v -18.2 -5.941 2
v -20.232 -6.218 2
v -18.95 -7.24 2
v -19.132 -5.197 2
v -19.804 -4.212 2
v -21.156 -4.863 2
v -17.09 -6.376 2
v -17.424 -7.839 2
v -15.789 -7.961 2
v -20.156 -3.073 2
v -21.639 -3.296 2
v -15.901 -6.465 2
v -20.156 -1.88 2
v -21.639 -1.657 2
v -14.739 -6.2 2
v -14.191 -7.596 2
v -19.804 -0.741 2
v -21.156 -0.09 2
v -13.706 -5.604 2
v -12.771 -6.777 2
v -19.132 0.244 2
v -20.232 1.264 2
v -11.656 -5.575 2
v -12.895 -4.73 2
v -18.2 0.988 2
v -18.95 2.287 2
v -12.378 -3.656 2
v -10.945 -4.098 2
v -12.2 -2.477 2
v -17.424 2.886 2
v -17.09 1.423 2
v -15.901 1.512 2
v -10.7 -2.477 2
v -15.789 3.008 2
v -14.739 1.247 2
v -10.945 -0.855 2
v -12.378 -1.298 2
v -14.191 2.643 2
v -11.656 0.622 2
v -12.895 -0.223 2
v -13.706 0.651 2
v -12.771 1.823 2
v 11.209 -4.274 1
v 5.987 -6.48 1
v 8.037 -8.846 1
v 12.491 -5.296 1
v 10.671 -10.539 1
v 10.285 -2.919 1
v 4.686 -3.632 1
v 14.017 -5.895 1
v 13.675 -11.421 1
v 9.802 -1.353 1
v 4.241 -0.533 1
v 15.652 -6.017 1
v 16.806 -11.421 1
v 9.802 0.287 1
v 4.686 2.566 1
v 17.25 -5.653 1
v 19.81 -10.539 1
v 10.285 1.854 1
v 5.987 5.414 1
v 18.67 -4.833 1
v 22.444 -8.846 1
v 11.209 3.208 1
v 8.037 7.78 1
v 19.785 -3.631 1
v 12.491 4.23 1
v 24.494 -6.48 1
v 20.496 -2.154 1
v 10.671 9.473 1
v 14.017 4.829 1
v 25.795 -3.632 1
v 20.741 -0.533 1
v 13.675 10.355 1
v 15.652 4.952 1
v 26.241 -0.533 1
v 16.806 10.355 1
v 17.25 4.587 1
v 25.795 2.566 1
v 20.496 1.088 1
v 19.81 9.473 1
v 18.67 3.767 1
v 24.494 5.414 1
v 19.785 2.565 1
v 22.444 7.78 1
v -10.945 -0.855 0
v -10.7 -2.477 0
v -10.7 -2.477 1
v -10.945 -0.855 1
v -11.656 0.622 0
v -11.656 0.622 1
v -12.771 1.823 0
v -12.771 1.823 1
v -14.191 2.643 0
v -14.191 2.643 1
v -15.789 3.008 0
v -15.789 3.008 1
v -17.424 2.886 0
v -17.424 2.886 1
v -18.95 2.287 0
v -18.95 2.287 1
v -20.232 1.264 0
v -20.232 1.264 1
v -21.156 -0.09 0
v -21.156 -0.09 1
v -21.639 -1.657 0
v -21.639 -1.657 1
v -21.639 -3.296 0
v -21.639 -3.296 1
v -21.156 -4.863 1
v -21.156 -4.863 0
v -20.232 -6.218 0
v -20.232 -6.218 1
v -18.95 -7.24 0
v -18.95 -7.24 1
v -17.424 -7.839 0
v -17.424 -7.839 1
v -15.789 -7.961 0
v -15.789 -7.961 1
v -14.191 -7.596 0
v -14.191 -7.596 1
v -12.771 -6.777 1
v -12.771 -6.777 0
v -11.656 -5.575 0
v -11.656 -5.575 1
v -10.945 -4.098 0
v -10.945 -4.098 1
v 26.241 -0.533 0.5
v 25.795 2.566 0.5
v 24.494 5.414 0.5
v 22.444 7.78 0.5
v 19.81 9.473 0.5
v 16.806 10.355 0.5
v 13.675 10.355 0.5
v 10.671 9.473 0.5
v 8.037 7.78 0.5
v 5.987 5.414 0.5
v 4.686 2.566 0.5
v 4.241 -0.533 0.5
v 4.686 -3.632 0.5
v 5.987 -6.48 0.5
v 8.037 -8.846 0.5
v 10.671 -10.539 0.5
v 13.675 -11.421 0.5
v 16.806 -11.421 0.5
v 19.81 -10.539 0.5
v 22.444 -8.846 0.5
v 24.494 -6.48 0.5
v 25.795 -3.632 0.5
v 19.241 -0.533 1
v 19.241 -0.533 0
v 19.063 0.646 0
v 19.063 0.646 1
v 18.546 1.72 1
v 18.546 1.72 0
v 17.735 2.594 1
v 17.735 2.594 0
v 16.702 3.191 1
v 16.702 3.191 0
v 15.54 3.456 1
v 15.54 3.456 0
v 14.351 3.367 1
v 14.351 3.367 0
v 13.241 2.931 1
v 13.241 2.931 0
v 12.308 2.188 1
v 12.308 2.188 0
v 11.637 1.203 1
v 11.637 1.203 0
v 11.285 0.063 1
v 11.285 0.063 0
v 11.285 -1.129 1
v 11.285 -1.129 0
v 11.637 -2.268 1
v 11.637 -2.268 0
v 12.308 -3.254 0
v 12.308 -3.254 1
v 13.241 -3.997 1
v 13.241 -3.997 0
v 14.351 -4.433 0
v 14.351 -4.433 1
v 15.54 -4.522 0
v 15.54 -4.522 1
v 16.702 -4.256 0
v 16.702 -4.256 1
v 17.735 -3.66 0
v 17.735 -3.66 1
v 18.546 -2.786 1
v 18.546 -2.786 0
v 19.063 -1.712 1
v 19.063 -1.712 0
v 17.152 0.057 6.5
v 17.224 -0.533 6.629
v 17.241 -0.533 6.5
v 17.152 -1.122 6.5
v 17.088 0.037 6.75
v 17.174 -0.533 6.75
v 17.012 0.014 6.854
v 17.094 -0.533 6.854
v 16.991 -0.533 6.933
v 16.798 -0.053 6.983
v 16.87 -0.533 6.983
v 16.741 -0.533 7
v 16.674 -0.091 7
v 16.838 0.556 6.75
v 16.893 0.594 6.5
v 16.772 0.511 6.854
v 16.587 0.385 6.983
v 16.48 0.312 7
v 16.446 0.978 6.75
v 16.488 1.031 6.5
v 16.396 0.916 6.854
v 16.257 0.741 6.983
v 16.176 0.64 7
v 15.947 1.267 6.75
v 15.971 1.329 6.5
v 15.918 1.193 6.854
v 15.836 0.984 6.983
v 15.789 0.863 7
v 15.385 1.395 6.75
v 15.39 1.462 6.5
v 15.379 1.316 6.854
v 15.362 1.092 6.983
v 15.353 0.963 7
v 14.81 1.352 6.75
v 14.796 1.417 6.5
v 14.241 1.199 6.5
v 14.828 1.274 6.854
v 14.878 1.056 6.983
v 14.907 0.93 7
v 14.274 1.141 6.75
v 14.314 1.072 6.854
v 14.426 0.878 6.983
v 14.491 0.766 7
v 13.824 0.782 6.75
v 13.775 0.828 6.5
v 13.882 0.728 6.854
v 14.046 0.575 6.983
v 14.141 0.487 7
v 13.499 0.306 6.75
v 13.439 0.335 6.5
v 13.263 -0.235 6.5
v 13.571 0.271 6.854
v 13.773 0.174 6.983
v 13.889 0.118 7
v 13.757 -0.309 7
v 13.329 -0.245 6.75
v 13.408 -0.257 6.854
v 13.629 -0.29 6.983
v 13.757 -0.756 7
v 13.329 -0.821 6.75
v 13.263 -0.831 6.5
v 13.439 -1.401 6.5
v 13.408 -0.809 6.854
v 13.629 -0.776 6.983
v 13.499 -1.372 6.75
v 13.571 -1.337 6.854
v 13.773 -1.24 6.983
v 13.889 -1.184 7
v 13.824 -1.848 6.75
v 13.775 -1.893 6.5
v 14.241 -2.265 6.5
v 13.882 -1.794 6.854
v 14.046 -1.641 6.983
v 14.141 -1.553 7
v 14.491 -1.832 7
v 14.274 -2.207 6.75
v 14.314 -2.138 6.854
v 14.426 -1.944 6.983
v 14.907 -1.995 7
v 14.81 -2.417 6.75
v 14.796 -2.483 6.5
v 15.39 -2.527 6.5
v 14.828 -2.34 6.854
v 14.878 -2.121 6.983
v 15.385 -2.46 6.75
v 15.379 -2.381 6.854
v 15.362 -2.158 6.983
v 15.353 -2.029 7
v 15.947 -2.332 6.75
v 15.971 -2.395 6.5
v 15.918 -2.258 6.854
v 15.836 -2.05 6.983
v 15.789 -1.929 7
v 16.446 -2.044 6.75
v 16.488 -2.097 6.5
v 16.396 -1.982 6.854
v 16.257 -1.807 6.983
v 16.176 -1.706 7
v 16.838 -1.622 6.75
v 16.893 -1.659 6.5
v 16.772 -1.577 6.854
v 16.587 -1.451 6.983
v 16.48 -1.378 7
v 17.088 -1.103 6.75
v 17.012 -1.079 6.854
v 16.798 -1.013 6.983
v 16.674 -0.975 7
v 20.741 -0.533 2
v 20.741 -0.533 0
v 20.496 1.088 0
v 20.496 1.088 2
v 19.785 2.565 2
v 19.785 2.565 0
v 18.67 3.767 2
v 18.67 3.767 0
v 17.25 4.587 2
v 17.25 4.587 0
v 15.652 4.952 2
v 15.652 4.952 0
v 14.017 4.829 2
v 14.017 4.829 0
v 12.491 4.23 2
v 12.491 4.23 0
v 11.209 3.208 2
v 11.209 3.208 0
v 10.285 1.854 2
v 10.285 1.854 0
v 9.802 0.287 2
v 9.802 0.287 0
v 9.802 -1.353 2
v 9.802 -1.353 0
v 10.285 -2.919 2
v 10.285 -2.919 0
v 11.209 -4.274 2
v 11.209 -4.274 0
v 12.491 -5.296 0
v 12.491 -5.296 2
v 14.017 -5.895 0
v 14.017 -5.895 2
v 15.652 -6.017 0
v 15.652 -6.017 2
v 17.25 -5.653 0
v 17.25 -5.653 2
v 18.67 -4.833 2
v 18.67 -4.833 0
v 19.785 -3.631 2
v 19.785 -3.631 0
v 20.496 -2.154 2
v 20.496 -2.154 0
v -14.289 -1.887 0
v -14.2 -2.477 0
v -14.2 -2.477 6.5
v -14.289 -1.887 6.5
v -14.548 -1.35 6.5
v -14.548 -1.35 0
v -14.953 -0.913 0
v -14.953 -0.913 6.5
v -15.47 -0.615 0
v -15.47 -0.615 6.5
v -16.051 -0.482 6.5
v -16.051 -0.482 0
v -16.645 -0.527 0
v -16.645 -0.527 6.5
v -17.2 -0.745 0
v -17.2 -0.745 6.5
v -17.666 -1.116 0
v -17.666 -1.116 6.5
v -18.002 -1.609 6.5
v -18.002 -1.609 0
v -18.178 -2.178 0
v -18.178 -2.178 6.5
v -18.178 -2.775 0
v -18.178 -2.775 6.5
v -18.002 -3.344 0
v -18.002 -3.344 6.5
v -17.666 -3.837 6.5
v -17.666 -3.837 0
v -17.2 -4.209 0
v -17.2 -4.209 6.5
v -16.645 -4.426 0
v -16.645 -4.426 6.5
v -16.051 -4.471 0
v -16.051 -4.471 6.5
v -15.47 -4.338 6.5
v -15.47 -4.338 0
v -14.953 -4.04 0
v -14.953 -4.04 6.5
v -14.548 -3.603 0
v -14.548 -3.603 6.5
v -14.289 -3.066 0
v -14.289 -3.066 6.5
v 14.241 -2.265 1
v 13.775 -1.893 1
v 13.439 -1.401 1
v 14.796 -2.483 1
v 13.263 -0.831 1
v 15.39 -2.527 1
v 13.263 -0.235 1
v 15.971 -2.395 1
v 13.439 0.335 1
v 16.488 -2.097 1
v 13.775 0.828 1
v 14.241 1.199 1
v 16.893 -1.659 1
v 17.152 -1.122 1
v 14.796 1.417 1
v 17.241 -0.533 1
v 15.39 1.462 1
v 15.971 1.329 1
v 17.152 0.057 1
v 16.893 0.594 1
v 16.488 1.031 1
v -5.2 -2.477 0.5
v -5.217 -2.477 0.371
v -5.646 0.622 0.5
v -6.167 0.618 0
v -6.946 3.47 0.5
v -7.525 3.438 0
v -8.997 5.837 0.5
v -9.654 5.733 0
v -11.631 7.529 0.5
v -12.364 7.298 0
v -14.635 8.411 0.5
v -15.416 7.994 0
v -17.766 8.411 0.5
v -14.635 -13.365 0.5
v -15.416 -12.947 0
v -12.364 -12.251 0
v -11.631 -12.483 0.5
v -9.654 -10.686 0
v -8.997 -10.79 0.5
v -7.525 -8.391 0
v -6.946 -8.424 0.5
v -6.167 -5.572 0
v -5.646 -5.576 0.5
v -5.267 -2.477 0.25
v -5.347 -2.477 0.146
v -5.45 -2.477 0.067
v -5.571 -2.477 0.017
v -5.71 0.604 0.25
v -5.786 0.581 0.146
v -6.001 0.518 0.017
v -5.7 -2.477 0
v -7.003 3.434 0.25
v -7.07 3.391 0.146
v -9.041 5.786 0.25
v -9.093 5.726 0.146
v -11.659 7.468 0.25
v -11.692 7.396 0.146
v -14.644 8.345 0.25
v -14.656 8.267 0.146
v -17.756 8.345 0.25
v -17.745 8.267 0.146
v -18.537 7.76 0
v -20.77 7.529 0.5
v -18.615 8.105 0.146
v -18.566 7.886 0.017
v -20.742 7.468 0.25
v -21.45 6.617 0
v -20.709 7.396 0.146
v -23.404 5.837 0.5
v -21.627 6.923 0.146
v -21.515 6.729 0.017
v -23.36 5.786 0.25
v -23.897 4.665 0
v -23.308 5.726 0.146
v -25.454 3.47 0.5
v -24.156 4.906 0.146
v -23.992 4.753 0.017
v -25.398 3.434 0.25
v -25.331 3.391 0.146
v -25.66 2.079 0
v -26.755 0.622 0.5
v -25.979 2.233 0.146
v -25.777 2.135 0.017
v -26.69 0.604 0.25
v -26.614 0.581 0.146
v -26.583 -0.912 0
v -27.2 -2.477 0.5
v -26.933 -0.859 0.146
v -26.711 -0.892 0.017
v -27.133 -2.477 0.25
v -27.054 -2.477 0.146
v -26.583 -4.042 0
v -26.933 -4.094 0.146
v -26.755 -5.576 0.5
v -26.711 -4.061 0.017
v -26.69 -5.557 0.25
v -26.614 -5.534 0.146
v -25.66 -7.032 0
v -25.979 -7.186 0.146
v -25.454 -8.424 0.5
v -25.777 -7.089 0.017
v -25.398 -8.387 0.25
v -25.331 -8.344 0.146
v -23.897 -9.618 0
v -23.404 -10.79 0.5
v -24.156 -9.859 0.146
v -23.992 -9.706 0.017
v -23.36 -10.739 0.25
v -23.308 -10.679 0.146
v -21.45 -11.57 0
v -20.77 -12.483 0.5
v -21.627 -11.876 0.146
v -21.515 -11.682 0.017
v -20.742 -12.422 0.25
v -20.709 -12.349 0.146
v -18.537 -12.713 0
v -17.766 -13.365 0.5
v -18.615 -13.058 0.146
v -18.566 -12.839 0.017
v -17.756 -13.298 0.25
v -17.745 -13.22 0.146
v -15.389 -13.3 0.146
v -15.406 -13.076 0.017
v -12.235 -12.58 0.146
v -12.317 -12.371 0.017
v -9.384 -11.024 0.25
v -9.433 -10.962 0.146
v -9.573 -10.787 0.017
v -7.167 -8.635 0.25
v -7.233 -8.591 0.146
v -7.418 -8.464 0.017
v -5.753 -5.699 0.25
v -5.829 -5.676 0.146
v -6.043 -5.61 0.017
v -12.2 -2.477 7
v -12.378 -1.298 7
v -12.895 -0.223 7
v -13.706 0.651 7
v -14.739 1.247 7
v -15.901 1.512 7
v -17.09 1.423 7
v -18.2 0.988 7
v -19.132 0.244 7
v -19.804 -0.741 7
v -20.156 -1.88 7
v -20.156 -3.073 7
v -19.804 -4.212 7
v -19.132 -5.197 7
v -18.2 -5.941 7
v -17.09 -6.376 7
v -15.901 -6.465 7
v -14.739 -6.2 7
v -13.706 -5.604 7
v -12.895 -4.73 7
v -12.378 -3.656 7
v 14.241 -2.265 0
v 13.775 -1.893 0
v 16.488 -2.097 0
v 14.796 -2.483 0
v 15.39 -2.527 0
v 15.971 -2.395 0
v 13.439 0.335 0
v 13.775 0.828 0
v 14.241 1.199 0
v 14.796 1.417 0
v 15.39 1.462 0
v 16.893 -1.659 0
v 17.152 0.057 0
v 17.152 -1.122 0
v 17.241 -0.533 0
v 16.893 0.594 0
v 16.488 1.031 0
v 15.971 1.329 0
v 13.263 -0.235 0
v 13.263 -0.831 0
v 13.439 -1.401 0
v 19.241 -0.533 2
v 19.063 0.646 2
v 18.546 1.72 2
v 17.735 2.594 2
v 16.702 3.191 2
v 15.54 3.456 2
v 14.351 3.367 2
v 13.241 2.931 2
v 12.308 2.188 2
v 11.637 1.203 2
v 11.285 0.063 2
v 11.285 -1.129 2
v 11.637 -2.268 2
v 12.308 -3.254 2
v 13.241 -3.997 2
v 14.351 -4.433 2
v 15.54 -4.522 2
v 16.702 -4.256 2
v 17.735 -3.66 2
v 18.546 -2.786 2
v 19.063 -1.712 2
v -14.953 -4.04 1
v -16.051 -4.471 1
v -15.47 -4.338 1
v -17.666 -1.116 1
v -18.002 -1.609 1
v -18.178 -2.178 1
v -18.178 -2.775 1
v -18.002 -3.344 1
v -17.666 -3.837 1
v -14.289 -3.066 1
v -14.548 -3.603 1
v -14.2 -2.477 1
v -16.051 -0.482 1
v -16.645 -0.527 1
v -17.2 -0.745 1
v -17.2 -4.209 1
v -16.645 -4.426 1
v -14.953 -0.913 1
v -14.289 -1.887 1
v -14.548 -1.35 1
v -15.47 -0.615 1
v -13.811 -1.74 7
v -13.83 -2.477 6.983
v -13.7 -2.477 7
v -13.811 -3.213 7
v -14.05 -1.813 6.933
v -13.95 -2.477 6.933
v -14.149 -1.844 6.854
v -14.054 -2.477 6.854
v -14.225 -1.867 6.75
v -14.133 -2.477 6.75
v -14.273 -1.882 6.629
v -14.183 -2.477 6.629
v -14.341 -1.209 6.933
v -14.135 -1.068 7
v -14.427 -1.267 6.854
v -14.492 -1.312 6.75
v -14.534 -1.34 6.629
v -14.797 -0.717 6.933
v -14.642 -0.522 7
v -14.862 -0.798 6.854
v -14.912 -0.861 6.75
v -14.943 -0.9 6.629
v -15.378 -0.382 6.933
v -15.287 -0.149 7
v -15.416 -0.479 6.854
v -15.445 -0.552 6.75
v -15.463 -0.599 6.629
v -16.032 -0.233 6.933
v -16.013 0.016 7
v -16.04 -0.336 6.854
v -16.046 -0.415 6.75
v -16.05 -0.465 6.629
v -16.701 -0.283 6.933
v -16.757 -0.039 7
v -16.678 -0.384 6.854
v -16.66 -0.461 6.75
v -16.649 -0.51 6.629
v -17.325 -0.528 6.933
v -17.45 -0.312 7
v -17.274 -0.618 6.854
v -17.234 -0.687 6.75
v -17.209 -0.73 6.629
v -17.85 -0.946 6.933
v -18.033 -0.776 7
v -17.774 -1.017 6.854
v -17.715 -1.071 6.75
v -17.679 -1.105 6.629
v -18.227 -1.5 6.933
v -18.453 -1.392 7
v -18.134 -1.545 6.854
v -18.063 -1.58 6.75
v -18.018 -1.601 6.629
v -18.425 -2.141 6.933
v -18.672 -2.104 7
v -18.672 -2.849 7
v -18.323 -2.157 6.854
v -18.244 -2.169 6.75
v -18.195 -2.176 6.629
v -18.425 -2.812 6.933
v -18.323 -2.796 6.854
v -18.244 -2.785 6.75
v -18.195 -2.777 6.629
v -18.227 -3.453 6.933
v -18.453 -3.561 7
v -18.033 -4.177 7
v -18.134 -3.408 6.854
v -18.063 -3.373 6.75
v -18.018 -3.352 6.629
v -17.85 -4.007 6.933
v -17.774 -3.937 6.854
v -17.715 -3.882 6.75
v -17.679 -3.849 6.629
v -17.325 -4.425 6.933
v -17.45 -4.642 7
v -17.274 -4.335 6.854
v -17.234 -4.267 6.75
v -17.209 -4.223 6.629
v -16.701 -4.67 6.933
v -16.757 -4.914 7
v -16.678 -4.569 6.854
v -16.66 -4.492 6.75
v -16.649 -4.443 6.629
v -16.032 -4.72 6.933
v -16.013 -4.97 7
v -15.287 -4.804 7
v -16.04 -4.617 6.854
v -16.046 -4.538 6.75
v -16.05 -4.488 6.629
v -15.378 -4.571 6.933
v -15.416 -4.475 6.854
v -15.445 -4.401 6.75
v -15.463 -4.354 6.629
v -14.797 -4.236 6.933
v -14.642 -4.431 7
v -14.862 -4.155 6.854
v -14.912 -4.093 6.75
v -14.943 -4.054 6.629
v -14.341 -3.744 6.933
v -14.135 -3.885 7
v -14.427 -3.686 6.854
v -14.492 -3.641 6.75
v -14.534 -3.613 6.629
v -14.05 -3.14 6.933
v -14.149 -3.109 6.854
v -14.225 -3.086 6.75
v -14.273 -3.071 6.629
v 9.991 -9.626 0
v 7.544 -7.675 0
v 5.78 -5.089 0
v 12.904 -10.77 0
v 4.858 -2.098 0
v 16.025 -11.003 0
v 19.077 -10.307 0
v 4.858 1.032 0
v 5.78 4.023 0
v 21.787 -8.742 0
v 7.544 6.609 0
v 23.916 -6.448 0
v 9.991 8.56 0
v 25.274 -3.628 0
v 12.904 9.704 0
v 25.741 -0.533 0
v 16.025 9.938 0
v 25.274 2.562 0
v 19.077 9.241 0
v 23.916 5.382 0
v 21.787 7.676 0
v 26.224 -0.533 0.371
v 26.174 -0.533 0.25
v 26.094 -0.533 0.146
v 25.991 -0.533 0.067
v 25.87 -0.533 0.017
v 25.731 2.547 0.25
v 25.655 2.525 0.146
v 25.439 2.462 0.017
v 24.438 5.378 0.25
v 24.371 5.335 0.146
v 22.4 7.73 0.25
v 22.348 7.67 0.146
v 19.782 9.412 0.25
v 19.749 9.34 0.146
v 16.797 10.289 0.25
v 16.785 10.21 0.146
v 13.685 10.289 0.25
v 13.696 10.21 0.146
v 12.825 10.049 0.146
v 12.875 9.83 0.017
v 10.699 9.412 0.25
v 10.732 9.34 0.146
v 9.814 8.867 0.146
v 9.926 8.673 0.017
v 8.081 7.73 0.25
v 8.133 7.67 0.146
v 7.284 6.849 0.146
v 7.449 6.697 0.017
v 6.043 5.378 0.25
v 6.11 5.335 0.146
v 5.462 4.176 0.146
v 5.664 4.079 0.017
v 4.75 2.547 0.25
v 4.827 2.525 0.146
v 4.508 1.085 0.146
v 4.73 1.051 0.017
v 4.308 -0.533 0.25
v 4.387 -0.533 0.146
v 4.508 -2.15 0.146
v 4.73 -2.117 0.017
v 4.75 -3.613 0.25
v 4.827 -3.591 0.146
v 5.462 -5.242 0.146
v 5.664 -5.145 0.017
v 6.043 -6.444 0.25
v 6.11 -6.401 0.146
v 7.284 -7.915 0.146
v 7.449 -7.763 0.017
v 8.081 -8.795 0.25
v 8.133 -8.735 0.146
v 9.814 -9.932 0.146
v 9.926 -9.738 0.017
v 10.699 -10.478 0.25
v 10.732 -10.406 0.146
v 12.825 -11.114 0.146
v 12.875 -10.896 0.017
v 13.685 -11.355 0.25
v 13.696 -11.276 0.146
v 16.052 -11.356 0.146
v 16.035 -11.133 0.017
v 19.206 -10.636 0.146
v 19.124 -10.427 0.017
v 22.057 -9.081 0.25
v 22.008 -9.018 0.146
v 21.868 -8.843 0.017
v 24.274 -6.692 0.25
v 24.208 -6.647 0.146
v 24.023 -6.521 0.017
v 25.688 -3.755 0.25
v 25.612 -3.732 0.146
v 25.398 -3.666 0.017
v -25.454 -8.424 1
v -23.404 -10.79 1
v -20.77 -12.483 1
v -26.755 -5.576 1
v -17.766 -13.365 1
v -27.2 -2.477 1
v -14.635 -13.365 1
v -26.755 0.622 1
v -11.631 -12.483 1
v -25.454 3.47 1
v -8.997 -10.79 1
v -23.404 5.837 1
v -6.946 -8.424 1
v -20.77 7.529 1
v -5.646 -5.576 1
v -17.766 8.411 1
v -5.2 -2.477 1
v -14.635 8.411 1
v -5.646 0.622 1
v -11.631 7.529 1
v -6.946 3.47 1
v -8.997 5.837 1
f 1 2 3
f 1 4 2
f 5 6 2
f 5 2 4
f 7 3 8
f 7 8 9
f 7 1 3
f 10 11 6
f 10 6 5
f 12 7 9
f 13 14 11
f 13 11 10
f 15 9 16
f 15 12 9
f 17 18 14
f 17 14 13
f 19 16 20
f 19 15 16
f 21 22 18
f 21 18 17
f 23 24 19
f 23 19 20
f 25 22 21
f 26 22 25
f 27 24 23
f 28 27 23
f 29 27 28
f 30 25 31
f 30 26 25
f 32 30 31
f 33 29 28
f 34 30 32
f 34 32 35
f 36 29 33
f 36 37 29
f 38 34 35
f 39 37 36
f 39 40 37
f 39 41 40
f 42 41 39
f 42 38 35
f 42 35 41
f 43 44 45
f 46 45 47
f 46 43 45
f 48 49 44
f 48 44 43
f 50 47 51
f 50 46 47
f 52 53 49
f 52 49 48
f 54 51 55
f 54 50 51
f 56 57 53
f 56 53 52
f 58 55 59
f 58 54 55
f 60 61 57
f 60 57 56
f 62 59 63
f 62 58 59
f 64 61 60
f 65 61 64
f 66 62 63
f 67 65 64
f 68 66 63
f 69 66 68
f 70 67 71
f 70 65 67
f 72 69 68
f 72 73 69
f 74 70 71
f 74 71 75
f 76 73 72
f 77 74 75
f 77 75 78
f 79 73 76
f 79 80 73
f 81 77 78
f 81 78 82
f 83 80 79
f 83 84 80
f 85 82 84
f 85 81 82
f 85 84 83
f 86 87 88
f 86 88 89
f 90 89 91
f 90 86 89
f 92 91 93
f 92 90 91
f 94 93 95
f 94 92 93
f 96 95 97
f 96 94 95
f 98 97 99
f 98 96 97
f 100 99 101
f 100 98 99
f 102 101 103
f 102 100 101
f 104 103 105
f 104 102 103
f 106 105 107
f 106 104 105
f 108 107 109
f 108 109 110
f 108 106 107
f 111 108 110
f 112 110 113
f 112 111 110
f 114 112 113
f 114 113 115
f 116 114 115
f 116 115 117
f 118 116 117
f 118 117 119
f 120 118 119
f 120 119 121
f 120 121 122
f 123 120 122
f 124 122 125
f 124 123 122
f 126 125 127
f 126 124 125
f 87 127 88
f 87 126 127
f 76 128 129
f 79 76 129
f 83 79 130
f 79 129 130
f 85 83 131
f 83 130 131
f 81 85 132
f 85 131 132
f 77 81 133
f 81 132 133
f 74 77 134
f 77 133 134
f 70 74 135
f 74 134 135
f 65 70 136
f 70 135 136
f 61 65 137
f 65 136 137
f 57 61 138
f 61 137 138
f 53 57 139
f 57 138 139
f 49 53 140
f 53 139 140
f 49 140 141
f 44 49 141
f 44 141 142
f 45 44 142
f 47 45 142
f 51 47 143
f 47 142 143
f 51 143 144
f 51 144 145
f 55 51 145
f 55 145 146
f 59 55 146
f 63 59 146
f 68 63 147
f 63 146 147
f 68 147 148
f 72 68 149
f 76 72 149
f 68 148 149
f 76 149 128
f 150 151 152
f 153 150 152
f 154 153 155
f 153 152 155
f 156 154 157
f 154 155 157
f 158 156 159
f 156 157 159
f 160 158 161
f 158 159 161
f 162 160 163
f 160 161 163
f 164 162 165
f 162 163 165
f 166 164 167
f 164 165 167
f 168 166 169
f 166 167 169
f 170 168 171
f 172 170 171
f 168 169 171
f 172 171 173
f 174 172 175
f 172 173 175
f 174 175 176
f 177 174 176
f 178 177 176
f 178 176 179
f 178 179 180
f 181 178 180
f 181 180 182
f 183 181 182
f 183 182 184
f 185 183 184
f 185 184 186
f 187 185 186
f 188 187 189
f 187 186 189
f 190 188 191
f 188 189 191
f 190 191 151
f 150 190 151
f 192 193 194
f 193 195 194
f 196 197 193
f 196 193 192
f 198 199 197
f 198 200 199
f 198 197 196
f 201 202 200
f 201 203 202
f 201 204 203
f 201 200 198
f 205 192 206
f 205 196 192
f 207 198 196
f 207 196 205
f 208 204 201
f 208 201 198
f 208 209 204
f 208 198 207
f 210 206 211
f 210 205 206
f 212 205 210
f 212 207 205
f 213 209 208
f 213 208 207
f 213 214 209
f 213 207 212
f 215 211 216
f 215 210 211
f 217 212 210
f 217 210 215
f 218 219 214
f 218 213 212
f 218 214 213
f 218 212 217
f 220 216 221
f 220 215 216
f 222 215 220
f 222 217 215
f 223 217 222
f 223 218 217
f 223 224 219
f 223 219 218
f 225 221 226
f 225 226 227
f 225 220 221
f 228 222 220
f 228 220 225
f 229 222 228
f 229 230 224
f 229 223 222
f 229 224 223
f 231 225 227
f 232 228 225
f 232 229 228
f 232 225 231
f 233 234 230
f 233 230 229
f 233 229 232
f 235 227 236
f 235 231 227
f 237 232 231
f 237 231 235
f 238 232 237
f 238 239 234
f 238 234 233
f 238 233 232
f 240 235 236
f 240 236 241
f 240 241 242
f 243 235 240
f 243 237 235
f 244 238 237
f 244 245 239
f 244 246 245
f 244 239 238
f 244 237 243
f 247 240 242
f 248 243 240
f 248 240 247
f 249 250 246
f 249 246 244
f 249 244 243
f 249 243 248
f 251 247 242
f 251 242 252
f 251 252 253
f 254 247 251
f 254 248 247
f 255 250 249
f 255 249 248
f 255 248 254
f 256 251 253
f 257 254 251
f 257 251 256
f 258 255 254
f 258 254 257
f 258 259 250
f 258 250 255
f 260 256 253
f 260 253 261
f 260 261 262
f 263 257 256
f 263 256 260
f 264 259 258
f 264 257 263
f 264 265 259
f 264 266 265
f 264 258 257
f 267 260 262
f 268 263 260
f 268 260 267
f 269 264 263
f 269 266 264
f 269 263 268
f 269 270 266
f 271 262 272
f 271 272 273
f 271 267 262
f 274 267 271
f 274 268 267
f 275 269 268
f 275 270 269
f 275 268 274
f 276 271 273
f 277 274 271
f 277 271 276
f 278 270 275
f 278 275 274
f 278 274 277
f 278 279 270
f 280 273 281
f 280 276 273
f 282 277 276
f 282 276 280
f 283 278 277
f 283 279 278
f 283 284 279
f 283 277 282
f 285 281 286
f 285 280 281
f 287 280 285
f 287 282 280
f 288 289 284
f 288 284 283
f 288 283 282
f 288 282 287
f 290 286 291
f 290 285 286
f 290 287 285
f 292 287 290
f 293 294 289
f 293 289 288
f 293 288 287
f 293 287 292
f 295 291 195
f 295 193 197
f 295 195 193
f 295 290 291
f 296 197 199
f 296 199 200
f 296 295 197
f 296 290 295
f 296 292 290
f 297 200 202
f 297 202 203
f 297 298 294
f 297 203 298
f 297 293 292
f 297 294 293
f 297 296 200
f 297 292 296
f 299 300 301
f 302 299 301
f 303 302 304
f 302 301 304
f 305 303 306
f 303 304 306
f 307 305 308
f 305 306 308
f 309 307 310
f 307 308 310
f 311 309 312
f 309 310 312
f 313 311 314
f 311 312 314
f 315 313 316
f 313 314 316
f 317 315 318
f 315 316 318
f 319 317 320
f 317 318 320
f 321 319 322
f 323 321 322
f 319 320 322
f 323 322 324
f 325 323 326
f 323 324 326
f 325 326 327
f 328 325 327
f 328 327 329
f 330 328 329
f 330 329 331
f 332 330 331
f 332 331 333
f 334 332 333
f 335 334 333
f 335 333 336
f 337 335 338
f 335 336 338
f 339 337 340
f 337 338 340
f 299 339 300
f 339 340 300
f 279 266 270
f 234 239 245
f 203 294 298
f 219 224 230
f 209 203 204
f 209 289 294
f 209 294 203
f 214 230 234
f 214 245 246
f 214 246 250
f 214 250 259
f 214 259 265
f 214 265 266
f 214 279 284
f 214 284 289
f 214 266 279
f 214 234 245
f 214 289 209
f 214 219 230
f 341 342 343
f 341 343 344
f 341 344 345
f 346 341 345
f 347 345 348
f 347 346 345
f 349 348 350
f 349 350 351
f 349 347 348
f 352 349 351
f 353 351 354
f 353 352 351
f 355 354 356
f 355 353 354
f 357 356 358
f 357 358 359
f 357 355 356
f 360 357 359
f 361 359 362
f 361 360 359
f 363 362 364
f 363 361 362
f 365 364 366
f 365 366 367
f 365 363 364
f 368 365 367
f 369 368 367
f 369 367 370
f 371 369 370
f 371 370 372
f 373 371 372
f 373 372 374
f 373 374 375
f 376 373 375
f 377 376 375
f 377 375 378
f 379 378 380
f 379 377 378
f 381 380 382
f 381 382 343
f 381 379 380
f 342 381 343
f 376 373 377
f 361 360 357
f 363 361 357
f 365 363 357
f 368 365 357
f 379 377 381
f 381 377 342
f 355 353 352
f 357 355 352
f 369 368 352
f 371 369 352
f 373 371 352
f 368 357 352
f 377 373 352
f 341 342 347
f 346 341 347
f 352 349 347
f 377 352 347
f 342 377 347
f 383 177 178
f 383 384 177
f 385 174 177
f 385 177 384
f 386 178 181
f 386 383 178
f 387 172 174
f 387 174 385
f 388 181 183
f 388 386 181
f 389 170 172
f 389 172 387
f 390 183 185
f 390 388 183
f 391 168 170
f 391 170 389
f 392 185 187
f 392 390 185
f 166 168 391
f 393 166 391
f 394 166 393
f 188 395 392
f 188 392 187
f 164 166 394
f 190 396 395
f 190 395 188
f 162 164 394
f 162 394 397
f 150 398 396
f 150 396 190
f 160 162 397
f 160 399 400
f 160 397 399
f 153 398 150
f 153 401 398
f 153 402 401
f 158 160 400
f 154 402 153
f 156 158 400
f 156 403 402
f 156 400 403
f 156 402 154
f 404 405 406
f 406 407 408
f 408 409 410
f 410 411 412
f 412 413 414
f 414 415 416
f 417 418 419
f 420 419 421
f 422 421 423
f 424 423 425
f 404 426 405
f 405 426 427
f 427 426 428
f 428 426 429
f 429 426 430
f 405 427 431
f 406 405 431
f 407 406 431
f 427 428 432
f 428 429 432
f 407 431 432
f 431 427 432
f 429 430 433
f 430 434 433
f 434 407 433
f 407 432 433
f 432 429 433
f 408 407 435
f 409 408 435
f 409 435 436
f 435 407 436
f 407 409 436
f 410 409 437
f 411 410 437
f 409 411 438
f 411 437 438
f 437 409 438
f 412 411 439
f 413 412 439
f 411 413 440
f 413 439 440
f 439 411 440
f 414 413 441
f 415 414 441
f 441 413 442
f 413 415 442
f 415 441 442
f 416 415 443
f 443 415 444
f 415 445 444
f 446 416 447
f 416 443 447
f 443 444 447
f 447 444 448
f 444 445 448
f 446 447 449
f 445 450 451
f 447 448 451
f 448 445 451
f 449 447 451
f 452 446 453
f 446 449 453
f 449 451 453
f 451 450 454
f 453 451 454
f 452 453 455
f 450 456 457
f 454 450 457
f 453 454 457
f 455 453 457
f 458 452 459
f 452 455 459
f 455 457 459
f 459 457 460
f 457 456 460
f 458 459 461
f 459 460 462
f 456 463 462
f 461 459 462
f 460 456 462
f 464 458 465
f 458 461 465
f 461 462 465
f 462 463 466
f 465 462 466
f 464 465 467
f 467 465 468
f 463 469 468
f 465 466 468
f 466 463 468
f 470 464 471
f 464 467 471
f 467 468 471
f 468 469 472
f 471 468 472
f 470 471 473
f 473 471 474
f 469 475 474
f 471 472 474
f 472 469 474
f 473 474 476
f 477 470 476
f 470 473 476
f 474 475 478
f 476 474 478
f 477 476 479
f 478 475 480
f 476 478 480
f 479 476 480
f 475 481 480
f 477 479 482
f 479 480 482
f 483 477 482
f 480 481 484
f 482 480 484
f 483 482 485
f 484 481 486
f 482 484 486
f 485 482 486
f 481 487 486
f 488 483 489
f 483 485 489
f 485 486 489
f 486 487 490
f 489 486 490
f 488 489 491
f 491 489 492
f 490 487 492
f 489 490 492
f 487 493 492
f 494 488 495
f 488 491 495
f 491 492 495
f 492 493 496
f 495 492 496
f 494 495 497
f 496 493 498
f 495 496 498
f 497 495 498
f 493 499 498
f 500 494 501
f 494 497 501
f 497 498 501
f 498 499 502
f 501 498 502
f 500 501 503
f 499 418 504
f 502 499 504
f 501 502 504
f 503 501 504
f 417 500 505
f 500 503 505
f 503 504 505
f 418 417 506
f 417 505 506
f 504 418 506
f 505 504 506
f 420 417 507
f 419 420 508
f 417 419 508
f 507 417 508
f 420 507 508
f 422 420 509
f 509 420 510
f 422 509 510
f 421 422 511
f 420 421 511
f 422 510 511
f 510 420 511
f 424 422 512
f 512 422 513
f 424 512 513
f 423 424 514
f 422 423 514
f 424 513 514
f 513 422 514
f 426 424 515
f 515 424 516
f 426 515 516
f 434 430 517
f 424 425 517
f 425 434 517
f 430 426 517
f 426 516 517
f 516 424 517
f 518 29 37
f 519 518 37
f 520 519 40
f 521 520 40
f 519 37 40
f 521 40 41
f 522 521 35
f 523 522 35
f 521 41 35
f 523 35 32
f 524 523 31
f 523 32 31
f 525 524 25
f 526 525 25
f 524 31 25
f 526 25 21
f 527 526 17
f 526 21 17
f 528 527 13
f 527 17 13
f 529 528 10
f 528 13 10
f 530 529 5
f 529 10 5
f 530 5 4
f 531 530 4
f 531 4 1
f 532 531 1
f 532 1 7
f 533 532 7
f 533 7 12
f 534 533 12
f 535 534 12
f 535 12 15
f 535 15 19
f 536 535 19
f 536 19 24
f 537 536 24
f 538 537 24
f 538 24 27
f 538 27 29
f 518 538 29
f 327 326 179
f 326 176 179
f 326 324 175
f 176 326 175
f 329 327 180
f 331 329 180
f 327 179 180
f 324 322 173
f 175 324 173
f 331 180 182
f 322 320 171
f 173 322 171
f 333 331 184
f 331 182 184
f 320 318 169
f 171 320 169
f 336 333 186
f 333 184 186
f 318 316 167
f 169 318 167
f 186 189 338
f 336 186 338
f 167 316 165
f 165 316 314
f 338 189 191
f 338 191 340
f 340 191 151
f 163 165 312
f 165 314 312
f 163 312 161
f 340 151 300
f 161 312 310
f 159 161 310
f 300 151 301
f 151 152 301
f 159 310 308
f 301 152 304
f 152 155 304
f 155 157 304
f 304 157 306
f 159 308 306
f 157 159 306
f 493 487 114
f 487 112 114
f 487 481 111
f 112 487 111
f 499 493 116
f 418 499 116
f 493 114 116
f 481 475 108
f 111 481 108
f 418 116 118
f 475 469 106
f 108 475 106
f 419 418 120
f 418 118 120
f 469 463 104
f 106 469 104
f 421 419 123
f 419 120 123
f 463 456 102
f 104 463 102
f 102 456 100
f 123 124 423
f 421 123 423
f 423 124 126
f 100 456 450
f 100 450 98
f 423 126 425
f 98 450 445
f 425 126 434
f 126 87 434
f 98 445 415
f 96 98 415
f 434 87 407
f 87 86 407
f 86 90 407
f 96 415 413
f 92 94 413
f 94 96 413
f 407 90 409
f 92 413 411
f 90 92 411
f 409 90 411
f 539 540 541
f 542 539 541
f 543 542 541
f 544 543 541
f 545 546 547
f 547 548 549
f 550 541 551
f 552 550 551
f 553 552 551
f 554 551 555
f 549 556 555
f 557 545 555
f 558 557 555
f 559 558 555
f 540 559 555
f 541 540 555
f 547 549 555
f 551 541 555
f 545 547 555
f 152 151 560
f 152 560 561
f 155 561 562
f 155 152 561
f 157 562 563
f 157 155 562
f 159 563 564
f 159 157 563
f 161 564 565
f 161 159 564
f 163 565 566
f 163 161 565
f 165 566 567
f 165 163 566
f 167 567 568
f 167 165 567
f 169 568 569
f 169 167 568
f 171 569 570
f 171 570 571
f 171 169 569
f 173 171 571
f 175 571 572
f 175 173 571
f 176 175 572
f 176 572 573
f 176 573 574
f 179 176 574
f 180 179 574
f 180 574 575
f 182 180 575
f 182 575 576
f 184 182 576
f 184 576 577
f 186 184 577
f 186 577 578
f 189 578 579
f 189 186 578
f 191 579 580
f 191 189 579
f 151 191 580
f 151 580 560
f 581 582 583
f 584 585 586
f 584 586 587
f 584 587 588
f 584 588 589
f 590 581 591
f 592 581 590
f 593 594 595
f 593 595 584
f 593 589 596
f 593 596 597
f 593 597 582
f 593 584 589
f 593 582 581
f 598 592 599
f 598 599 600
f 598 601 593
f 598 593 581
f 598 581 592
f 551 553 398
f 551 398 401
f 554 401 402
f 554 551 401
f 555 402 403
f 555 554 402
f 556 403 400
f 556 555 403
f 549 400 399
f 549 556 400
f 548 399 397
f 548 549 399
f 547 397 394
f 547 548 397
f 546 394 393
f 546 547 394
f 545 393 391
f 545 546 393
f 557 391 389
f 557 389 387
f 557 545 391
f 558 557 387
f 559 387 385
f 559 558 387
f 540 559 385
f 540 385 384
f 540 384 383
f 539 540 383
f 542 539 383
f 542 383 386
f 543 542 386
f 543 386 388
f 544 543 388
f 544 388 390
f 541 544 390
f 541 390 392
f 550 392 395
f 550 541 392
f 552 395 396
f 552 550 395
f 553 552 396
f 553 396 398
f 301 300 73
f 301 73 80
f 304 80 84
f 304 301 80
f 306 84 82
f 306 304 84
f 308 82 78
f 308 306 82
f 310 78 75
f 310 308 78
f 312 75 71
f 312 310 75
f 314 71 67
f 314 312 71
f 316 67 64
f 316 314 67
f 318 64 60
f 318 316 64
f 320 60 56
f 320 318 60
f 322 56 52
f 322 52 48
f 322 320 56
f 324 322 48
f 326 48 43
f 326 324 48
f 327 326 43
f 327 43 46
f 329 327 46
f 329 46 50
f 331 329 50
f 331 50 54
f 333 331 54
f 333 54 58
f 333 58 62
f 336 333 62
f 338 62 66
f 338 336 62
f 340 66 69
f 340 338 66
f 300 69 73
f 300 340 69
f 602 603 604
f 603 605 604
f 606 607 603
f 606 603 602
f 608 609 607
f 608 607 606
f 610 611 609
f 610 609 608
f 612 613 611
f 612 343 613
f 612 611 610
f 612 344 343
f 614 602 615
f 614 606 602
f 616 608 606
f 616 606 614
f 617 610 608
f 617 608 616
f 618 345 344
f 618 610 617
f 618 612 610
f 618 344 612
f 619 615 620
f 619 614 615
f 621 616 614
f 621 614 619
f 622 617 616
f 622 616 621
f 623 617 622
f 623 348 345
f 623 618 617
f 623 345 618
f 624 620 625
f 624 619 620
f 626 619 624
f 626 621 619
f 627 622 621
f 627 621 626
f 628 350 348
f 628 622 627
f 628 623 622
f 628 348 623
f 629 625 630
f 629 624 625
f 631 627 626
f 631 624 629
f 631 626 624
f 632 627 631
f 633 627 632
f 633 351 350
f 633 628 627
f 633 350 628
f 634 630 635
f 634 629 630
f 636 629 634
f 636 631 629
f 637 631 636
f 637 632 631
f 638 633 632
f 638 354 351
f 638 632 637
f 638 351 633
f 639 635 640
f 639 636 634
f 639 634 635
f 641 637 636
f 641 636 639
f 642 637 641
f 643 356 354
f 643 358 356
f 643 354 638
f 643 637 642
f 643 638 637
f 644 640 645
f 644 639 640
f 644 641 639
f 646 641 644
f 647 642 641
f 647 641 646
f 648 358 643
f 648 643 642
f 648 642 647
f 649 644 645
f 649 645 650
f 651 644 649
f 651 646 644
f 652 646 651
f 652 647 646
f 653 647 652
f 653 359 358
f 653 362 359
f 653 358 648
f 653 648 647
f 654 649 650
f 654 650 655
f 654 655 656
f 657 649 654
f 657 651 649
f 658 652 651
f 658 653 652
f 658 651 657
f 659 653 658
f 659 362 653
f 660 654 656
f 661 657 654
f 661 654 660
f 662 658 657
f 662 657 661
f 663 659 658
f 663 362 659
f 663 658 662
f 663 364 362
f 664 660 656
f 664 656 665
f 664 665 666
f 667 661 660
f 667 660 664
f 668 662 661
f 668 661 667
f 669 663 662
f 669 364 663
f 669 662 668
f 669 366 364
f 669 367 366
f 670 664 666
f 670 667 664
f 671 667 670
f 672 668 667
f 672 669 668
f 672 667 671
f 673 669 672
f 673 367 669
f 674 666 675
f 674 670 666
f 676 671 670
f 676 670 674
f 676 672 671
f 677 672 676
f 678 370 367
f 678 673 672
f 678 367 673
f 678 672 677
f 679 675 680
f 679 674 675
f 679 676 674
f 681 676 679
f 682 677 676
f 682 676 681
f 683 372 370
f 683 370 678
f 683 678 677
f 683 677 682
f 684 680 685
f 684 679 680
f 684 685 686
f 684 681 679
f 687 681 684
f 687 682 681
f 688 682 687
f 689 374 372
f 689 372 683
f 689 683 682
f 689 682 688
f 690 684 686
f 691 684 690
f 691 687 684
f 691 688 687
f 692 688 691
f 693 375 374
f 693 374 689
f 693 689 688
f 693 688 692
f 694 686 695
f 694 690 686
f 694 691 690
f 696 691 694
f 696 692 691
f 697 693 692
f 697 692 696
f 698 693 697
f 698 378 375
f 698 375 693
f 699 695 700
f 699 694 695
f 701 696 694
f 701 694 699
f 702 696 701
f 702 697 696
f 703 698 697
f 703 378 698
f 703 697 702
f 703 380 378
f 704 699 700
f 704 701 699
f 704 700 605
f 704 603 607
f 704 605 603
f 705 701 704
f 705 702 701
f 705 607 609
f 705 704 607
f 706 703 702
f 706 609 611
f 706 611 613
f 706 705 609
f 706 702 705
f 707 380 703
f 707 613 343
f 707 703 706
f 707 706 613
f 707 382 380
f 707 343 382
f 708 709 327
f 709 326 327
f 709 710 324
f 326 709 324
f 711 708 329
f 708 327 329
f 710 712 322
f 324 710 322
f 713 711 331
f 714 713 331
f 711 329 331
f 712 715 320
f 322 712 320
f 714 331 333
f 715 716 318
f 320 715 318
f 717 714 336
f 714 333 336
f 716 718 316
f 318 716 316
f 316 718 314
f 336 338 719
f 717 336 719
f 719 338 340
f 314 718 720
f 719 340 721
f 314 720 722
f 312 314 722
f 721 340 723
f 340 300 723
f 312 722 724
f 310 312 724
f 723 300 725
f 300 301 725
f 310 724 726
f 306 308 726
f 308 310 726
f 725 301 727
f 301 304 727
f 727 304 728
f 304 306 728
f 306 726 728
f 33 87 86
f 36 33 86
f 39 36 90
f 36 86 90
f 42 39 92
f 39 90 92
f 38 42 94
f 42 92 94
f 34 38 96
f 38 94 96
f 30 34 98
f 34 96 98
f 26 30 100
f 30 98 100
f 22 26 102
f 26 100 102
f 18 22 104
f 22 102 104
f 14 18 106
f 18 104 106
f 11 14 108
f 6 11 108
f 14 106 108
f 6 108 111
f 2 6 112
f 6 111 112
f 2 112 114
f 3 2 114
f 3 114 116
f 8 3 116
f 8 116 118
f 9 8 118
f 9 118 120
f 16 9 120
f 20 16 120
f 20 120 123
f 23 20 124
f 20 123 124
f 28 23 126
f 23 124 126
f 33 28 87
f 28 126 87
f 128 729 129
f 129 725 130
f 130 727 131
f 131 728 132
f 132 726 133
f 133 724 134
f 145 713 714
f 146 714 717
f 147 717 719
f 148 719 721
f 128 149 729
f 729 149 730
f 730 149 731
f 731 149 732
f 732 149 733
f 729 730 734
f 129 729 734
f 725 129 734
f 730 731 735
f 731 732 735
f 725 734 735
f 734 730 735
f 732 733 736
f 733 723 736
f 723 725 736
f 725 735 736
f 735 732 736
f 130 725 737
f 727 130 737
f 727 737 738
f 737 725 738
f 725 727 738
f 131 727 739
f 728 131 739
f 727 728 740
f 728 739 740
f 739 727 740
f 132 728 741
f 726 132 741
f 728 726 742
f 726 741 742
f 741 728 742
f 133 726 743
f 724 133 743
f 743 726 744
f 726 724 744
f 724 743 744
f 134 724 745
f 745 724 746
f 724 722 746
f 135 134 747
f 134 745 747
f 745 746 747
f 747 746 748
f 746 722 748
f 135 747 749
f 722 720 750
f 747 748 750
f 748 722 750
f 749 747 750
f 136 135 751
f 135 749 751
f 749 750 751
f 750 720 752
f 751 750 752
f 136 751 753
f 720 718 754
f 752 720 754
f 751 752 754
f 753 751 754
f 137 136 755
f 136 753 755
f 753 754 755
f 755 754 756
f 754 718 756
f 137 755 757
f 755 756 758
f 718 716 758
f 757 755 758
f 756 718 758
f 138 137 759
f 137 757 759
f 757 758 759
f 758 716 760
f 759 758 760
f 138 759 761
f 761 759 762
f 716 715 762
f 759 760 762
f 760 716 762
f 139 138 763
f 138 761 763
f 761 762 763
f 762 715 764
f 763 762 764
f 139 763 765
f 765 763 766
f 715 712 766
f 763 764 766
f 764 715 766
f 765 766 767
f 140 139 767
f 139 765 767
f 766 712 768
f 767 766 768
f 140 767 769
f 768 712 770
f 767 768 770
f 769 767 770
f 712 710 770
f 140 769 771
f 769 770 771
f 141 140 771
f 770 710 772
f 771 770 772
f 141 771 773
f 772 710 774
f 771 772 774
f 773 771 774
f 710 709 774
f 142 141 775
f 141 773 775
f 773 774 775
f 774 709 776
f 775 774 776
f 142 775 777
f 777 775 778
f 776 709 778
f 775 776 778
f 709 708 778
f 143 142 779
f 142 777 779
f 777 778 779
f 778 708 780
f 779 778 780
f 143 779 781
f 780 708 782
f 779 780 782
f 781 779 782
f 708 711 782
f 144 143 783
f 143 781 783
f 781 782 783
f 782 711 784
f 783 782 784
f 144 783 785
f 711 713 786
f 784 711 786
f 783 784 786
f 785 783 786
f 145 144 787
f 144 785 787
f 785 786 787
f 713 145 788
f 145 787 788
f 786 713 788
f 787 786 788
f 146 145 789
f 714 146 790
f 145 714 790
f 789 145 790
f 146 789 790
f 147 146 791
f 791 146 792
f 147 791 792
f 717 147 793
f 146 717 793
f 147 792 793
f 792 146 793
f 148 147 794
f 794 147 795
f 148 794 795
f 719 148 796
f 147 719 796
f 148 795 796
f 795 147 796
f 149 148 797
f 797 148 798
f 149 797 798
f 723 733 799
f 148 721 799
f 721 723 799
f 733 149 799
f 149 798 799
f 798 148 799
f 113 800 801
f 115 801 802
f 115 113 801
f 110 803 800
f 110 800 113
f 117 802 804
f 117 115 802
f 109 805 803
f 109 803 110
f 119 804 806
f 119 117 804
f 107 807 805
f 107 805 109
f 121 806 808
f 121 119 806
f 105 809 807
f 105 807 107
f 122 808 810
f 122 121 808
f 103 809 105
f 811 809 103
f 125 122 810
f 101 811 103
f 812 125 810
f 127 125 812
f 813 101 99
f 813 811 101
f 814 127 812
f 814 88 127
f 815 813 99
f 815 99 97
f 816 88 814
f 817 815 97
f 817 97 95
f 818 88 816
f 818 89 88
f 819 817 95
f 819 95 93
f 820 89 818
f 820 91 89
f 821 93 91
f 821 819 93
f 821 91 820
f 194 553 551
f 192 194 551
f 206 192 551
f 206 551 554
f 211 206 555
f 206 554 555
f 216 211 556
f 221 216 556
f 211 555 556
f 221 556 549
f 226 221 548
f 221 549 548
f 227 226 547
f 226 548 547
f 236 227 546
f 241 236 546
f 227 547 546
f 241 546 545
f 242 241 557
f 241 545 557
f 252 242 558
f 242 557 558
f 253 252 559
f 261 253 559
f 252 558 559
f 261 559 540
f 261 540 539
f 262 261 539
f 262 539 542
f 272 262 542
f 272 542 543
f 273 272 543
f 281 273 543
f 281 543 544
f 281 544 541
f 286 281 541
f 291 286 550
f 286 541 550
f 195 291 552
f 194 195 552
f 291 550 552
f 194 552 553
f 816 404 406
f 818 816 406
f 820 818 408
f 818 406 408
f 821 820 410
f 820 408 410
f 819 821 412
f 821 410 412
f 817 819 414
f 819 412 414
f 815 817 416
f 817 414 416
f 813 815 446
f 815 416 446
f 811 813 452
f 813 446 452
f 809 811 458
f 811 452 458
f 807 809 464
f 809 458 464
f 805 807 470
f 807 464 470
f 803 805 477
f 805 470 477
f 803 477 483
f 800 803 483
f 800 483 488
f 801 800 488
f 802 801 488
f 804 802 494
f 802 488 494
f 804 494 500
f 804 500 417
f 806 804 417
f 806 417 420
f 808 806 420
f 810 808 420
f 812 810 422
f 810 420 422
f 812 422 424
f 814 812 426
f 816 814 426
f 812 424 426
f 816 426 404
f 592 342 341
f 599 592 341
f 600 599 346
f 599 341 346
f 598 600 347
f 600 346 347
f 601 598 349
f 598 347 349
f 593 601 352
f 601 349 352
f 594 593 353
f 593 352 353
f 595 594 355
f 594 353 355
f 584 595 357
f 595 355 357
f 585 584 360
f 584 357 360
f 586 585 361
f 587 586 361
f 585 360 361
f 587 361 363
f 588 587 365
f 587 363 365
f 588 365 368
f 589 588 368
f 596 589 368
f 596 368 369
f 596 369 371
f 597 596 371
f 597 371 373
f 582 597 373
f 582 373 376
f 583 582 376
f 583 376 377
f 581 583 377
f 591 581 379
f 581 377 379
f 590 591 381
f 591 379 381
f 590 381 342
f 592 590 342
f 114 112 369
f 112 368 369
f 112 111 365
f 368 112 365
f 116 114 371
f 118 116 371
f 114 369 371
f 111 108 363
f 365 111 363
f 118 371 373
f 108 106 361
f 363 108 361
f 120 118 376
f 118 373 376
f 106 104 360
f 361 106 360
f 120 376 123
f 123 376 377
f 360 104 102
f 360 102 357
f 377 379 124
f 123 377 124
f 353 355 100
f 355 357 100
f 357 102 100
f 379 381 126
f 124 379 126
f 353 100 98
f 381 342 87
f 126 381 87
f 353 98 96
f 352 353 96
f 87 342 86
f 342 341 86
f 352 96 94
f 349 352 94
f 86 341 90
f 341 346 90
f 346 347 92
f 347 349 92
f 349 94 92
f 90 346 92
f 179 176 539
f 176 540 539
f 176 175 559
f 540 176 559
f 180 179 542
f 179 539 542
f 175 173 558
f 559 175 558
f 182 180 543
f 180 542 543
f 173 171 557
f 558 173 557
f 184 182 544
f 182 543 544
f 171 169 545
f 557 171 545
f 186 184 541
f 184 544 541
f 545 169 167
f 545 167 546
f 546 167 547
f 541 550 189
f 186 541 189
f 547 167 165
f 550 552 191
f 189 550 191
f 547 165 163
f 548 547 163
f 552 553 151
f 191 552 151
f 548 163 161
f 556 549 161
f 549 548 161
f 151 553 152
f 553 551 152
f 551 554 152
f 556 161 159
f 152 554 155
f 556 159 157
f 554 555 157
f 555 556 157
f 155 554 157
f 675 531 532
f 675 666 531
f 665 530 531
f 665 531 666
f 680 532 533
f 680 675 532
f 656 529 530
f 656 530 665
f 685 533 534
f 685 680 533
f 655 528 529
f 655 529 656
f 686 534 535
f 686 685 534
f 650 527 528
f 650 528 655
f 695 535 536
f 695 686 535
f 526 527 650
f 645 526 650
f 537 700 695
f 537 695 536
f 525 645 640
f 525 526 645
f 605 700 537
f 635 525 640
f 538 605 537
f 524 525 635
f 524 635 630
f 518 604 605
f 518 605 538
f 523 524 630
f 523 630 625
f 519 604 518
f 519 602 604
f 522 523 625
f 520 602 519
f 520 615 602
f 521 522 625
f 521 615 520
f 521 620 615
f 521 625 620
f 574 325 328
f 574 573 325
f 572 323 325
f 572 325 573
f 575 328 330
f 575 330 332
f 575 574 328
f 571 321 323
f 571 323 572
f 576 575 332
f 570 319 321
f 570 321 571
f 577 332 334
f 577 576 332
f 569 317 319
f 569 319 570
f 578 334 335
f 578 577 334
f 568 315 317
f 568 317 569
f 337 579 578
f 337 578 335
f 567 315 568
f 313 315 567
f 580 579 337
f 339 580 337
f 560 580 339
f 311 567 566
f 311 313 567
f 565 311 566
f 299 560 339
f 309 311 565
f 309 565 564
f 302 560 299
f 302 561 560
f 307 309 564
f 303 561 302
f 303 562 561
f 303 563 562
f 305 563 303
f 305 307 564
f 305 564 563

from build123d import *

# Parameters (mm, degrees)
F0_R     = 11
F0_R_2   = 5.5
F1_DEPTH = 1
F2_DEPTH = 1
F0_R_3   = 4
F3_DEPTH = 2
F0_R_4   = 2
F4_DEPTH = 7
F5_DEPTH = 1
F6_R     = 0.5
F6_2_R   = 0.5
F7_R     = 0.5


with BuildPart() as f1:
    # F0 (on Top) → F1 (new body)
    with BuildSketch(Plane.XY):
        with Locations((15.240614, -0.532838)):
            Circle(F0_R)
        with Locations((15.240614, -0.532838)):
            Circle(F0_R_2, mode=Mode.SUBTRACT)
    extrude(amount=F1_DEPTH)

    # F6
    f6_edges = [f1.edges().sort_by_distance(p)[0] for p in [
        (4.240614, -0.532838, 0),
    ]]
    fillet(f6_edges, radius=F6_R)


with BuildPart() as f2:
    # F0 (on Top) → F2 (new body)
    with BuildSketch(Plane.XY):
        with Locations((-16.200279, -2.476575)):
            Circle(F0_R)
        with Locations((-16.200279, -2.476575)):
            Circle(F0_R_2, mode=Mode.SUBTRACT)
    extrude(amount=F2_DEPTH)

    # F6#2
    f6_2_edges = [f2.edges().sort_by_distance(p)[0] for p in [
        (-27.200279, -2.476575, 0),
    ]]
    fillet(f6_2_edges, radius=F6_2_R)


with BuildPart() as f3:
    # F0 (on Top) → F3 (new body)
    with BuildSketch(Plane.XY):
        with Locations((-16.200279, -2.476575)):
            Circle(F0_R_2)
        with Locations((-16.200279, -2.476575)):
            Circle(F0_R_3, mode=Mode.SUBTRACT)
        with Locations((15.240614, -0.532838)):
            Circle(F0_R_2)
        with Locations((15.240614, -0.532838)):
            Circle(F0_R_3, mode=Mode.SUBTRACT)
    extrude(amount=F3_DEPTH)

    # F0 (on Top) → F4 (join)
    with BuildSketch(Plane.XY):
        with Locations((-16.200279, -2.476575)):
            Circle(F0_R_3)
        with Locations((-16.200279, -2.476575)):
            Circle(F0_R_4, mode=Mode.SUBTRACT)
        with Locations((15.240614, -0.532838)):
            Circle(F0_R_4)
    extrude(amount=F4_DEPTH)

    # F7
    f7_edges = [f3.edges().sort_by_distance(p)[0] for p in [
        (13.240614, -0.532838, 7),
        (-18.200279, -2.476575, 7),
    ]]
    fillet(f7_edges, radius=F7_R)


with BuildPart() as f5:
    # F0 (on Top) → F5 (new body)
    with BuildSketch(Plane.XY):
        with Locations((-16.200279, -2.476575)):
            Circle(F0_R_4)
        with Locations((15.240614, -0.532838)):
            Circle(F0_R_3)
        with Locations((15.240614, -0.532838)):
            Circle(F0_R_4, mode=Mode.SUBTRACT)
    extrude(amount=F5_DEPTH)


solid = Compound([f1.part, f2.part, f3.part, f5.part])
